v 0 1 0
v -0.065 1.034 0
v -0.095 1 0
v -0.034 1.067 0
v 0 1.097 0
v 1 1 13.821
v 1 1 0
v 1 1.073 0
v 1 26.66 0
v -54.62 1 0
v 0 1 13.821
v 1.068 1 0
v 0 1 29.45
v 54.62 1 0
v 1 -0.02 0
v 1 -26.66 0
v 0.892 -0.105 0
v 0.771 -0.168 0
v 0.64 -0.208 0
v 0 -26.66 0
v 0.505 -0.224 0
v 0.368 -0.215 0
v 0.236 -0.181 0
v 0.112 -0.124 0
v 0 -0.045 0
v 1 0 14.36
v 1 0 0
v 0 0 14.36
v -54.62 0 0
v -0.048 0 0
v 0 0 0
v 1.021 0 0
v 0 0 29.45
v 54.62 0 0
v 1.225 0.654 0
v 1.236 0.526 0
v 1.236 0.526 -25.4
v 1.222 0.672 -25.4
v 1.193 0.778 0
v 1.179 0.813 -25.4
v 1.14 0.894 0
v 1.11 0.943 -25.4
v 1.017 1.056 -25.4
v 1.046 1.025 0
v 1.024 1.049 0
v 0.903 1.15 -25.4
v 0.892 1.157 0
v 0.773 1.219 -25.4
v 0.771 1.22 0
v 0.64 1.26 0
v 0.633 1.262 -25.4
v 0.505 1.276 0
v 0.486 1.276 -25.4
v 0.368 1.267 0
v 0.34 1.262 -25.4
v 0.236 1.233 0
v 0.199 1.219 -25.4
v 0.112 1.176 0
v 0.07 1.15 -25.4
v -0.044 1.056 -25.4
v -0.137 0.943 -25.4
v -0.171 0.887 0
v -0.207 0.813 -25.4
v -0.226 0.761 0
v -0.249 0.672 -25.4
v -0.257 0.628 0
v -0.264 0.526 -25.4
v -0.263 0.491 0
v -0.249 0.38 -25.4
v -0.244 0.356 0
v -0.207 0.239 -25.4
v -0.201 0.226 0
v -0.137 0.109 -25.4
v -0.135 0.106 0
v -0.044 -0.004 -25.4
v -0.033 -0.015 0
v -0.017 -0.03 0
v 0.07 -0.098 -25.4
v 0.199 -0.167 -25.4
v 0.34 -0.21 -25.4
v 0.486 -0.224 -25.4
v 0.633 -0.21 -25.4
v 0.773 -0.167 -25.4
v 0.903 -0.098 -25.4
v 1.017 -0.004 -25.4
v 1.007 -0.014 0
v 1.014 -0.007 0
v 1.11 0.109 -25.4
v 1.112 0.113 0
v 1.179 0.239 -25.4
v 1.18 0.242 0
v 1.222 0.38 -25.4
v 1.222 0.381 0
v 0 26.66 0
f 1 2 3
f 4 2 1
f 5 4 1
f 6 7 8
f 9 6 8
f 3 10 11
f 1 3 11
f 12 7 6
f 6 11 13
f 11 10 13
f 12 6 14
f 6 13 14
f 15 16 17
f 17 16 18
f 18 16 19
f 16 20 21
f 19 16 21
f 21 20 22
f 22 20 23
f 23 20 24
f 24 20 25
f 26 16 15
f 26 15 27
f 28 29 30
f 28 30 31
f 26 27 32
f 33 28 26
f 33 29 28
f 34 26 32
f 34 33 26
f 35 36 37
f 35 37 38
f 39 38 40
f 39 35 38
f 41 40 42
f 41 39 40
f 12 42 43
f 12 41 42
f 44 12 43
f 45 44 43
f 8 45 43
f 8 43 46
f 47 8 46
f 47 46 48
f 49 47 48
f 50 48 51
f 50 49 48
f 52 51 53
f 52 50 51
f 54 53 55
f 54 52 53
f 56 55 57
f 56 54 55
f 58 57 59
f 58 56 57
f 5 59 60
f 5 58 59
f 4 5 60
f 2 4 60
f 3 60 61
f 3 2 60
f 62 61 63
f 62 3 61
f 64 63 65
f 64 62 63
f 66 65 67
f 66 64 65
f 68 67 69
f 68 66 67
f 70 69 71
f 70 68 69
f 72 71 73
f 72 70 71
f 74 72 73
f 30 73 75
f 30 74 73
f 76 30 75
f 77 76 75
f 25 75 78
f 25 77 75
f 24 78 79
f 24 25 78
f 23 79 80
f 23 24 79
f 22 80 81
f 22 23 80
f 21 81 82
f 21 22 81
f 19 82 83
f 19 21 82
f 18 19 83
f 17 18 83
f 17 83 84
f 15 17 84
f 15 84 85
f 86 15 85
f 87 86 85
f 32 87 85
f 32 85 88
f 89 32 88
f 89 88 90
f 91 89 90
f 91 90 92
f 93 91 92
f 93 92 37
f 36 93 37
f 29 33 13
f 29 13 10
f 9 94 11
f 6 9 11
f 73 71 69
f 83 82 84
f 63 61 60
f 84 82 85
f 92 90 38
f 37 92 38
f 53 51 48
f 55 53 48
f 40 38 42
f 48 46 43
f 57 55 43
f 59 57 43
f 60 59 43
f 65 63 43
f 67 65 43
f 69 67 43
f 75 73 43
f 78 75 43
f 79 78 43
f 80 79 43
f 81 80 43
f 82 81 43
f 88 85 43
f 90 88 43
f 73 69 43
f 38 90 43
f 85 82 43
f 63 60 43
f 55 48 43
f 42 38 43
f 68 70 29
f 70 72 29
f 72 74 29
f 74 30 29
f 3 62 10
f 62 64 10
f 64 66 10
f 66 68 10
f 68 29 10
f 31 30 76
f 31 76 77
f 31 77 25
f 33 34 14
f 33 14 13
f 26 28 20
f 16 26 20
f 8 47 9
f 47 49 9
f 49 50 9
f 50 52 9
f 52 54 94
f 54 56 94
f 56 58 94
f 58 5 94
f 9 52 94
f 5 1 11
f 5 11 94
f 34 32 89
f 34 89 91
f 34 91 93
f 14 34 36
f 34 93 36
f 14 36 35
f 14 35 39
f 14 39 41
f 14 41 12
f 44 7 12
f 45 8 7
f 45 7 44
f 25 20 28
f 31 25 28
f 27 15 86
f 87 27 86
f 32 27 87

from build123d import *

# Parameters (mm, degrees)
F2_DEPTH = 1
F3_DEPTH = 1
F4_R     = 0.75
F5_DEPTH = 25.4


with BuildPart() as f2:
    # F0 (on Front) → F2 (new body)
    with BuildSketch(Plane.XZ):
        Polygon((-54.62, 0), (0, 0), (0, 29.45), align=None)
        Polygon((0, 29.45), (0, 0), (54.62, 0), align=None)
    extrude(amount=-F2_DEPTH)

    # F1 (on Right) → F3 (join)
    with BuildSketch(Plane.YZ):
        Polygon((0, 14.36), (0, 0), (26.66, 0), align=None)
        Polygon((-26.66, 0), (0, 0), (0, 14.36), align=None)
    extrude(amount=F3_DEPTH)

    # F4 (on Top) → F5 (join)
    with BuildSketch(Plane.XY):
        with Locations((0.486322, 0.526076)):
            Circle(F4_R)
    extrude(amount=-F5_DEPTH)


solid = f2.part
